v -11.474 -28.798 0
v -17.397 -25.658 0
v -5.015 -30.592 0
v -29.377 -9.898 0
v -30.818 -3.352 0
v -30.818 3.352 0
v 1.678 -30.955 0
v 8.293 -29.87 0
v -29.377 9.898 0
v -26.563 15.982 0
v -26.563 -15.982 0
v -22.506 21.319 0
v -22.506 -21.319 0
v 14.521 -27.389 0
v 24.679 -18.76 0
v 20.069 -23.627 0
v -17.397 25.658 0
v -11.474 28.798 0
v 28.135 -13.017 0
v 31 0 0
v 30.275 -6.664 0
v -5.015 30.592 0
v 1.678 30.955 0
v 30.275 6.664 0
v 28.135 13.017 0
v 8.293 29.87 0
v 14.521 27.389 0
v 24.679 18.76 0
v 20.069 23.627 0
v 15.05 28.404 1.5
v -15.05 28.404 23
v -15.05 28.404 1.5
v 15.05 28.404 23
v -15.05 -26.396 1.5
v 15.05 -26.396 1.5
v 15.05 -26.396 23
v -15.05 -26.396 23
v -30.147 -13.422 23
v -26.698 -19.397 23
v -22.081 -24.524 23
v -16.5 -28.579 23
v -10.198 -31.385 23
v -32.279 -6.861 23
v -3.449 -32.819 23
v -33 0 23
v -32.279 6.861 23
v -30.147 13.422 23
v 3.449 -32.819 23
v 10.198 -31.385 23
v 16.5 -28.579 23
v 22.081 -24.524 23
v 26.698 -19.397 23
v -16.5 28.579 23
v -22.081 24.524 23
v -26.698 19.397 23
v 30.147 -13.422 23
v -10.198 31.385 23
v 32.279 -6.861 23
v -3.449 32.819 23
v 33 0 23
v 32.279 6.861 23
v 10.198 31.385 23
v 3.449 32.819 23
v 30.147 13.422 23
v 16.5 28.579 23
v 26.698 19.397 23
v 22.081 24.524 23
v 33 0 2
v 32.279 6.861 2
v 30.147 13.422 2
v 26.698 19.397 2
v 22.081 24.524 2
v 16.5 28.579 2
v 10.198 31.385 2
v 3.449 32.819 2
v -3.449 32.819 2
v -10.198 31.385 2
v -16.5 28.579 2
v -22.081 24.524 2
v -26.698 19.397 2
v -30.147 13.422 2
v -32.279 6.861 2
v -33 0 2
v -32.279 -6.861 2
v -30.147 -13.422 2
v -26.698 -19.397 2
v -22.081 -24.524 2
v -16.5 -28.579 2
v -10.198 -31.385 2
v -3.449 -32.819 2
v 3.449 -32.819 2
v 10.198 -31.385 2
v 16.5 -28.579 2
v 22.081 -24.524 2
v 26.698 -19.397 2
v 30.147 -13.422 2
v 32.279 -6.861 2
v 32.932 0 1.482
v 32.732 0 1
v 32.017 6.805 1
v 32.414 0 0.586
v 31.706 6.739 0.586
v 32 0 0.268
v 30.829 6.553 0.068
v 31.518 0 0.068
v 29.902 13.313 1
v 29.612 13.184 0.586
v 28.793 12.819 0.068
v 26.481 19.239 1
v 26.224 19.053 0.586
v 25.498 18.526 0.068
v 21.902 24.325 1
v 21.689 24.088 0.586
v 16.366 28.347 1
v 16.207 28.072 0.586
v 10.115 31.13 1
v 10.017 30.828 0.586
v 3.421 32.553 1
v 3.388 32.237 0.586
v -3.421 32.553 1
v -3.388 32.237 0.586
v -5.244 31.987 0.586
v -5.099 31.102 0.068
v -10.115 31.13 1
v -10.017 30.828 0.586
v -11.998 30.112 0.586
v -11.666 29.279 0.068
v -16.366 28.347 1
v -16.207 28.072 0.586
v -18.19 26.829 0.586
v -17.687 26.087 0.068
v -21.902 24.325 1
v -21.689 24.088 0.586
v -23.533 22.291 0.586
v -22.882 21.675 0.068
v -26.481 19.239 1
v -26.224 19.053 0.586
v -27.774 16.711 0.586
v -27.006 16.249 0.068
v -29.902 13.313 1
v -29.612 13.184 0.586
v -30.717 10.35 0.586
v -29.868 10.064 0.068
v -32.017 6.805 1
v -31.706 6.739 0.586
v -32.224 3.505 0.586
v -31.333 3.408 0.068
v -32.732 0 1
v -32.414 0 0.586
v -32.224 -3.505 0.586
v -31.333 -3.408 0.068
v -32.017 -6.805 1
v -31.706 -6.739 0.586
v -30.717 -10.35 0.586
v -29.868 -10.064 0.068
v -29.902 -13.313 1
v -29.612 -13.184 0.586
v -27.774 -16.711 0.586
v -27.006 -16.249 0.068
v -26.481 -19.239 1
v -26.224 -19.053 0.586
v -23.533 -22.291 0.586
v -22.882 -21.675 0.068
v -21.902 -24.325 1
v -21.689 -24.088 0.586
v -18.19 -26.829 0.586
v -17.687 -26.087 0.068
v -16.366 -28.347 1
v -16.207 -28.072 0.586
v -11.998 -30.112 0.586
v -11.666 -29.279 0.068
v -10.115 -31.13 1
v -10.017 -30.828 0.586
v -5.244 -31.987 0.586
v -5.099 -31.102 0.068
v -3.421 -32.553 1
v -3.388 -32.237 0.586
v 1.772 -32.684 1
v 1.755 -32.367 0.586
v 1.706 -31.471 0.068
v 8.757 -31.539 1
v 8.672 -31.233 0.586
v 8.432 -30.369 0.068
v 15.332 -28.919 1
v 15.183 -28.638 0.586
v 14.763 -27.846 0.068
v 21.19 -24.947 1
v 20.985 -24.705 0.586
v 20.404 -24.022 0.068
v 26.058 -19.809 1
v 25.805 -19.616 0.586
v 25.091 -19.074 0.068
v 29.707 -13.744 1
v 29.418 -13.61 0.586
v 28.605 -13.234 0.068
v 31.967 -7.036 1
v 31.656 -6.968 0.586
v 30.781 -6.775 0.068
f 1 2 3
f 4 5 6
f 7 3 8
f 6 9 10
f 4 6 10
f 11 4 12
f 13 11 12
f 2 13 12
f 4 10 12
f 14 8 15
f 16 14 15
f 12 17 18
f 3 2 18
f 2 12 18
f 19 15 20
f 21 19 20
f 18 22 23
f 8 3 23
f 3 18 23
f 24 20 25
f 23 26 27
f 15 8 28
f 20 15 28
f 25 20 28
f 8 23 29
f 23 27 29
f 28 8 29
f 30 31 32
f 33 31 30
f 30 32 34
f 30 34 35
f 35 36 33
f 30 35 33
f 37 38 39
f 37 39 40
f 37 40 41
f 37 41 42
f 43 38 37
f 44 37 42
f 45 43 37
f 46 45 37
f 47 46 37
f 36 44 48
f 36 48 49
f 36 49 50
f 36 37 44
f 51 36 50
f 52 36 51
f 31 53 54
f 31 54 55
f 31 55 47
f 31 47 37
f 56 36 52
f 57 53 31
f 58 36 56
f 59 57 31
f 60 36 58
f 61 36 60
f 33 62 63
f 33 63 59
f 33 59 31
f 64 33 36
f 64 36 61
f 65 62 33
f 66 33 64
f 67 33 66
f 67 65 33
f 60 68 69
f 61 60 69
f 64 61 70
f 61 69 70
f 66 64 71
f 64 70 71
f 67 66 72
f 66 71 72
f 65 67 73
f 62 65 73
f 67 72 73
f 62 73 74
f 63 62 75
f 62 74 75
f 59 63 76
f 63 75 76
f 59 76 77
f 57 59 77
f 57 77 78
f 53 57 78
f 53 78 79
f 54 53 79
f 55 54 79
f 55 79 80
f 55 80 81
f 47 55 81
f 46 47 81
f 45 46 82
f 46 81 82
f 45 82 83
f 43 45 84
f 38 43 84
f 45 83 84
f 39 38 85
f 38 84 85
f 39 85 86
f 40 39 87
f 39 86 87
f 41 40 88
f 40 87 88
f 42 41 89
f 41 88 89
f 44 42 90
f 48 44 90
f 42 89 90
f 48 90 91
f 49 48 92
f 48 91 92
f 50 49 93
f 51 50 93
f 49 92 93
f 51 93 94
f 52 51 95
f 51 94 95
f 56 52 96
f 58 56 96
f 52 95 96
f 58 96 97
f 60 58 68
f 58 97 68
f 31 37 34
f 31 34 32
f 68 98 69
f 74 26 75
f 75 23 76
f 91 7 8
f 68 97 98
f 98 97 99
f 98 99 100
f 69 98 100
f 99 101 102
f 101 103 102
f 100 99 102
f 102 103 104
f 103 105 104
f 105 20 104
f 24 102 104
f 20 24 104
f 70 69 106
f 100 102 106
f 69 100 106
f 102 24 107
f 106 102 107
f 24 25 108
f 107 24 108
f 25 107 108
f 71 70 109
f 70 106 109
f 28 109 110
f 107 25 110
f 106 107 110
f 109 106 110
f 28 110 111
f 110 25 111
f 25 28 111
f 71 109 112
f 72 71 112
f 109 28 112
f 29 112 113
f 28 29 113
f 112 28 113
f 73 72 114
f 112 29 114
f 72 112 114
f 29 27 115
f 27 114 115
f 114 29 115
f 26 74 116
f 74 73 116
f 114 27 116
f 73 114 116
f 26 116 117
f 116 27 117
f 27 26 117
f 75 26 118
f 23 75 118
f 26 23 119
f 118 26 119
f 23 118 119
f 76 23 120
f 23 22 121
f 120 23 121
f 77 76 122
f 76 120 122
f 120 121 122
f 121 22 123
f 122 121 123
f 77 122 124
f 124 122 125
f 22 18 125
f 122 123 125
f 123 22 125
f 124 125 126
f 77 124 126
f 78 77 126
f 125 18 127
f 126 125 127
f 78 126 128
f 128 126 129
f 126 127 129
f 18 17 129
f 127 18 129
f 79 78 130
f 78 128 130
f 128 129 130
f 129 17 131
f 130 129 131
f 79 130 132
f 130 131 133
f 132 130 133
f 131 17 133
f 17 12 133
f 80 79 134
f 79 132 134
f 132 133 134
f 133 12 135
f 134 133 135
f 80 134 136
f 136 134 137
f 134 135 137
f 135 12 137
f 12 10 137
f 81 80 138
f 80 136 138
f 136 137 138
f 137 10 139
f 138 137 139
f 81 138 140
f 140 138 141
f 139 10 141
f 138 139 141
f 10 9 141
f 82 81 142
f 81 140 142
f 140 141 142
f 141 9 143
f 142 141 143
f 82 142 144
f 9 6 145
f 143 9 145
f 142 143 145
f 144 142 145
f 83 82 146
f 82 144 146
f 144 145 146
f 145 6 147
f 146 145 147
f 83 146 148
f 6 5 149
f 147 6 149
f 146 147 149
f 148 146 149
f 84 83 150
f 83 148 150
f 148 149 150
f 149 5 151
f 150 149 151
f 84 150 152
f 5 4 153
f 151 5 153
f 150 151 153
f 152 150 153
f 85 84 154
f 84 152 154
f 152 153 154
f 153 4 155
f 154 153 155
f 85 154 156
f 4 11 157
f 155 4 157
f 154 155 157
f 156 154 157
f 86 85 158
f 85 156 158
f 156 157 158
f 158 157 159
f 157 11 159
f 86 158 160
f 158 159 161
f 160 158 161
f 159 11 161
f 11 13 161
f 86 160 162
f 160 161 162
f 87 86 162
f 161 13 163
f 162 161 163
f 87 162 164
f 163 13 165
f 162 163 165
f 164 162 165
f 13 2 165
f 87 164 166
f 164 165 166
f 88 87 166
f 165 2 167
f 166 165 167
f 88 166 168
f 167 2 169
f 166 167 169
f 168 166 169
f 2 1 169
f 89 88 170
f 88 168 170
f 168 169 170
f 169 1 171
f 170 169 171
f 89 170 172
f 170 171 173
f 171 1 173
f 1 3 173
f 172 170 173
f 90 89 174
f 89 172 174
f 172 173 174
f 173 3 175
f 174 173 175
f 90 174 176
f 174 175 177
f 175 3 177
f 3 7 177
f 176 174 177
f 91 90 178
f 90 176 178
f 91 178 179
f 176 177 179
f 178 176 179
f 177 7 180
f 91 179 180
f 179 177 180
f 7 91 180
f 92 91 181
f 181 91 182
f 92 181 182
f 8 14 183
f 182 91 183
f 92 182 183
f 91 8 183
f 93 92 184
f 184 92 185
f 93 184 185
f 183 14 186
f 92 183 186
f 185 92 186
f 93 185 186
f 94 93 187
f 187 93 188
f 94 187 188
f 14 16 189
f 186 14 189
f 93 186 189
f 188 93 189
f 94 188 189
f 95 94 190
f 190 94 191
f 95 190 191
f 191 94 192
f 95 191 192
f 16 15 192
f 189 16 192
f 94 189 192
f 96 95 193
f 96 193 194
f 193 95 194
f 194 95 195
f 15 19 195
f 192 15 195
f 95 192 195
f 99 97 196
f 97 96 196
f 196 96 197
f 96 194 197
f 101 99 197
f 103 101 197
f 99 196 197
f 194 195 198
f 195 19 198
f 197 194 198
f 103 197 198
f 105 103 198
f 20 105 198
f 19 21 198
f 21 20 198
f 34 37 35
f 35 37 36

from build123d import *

# Parameters (mm, degrees)
SKETCH_R     = 33
PAD_DEPTH    = 23
SKETCH001_W  = 30.1
SKETCH001_H  = 54.8
POCKET_DEPTH = 21.5
FILLET_R     = 2


with BuildPart() as part:
    # Sketch → Pad (new body)
    with BuildSketch(Plane.XY):
        Circle(SKETCH_R)
    extrude(amount=PAD_DEPTH)

    # Sketch001 (on Face3 of Pad) → Pocket (cut)
    with BuildSketch(Plane.XY.offset(23)):
        with Locations((0, 1.004219)):
            Rectangle(SKETCH001_W, SKETCH001_H)
    extrude(amount=-POCKET_DEPTH, mode=Mode.SUBTRACT)

    # Fillet
    fillet_edges = [part.edges().sort_by_distance(p)[0] for p in [
        (-33, 0, 0),
    ]]
    fillet(fillet_edges, radius=FILLET_R)


solid = part.part
